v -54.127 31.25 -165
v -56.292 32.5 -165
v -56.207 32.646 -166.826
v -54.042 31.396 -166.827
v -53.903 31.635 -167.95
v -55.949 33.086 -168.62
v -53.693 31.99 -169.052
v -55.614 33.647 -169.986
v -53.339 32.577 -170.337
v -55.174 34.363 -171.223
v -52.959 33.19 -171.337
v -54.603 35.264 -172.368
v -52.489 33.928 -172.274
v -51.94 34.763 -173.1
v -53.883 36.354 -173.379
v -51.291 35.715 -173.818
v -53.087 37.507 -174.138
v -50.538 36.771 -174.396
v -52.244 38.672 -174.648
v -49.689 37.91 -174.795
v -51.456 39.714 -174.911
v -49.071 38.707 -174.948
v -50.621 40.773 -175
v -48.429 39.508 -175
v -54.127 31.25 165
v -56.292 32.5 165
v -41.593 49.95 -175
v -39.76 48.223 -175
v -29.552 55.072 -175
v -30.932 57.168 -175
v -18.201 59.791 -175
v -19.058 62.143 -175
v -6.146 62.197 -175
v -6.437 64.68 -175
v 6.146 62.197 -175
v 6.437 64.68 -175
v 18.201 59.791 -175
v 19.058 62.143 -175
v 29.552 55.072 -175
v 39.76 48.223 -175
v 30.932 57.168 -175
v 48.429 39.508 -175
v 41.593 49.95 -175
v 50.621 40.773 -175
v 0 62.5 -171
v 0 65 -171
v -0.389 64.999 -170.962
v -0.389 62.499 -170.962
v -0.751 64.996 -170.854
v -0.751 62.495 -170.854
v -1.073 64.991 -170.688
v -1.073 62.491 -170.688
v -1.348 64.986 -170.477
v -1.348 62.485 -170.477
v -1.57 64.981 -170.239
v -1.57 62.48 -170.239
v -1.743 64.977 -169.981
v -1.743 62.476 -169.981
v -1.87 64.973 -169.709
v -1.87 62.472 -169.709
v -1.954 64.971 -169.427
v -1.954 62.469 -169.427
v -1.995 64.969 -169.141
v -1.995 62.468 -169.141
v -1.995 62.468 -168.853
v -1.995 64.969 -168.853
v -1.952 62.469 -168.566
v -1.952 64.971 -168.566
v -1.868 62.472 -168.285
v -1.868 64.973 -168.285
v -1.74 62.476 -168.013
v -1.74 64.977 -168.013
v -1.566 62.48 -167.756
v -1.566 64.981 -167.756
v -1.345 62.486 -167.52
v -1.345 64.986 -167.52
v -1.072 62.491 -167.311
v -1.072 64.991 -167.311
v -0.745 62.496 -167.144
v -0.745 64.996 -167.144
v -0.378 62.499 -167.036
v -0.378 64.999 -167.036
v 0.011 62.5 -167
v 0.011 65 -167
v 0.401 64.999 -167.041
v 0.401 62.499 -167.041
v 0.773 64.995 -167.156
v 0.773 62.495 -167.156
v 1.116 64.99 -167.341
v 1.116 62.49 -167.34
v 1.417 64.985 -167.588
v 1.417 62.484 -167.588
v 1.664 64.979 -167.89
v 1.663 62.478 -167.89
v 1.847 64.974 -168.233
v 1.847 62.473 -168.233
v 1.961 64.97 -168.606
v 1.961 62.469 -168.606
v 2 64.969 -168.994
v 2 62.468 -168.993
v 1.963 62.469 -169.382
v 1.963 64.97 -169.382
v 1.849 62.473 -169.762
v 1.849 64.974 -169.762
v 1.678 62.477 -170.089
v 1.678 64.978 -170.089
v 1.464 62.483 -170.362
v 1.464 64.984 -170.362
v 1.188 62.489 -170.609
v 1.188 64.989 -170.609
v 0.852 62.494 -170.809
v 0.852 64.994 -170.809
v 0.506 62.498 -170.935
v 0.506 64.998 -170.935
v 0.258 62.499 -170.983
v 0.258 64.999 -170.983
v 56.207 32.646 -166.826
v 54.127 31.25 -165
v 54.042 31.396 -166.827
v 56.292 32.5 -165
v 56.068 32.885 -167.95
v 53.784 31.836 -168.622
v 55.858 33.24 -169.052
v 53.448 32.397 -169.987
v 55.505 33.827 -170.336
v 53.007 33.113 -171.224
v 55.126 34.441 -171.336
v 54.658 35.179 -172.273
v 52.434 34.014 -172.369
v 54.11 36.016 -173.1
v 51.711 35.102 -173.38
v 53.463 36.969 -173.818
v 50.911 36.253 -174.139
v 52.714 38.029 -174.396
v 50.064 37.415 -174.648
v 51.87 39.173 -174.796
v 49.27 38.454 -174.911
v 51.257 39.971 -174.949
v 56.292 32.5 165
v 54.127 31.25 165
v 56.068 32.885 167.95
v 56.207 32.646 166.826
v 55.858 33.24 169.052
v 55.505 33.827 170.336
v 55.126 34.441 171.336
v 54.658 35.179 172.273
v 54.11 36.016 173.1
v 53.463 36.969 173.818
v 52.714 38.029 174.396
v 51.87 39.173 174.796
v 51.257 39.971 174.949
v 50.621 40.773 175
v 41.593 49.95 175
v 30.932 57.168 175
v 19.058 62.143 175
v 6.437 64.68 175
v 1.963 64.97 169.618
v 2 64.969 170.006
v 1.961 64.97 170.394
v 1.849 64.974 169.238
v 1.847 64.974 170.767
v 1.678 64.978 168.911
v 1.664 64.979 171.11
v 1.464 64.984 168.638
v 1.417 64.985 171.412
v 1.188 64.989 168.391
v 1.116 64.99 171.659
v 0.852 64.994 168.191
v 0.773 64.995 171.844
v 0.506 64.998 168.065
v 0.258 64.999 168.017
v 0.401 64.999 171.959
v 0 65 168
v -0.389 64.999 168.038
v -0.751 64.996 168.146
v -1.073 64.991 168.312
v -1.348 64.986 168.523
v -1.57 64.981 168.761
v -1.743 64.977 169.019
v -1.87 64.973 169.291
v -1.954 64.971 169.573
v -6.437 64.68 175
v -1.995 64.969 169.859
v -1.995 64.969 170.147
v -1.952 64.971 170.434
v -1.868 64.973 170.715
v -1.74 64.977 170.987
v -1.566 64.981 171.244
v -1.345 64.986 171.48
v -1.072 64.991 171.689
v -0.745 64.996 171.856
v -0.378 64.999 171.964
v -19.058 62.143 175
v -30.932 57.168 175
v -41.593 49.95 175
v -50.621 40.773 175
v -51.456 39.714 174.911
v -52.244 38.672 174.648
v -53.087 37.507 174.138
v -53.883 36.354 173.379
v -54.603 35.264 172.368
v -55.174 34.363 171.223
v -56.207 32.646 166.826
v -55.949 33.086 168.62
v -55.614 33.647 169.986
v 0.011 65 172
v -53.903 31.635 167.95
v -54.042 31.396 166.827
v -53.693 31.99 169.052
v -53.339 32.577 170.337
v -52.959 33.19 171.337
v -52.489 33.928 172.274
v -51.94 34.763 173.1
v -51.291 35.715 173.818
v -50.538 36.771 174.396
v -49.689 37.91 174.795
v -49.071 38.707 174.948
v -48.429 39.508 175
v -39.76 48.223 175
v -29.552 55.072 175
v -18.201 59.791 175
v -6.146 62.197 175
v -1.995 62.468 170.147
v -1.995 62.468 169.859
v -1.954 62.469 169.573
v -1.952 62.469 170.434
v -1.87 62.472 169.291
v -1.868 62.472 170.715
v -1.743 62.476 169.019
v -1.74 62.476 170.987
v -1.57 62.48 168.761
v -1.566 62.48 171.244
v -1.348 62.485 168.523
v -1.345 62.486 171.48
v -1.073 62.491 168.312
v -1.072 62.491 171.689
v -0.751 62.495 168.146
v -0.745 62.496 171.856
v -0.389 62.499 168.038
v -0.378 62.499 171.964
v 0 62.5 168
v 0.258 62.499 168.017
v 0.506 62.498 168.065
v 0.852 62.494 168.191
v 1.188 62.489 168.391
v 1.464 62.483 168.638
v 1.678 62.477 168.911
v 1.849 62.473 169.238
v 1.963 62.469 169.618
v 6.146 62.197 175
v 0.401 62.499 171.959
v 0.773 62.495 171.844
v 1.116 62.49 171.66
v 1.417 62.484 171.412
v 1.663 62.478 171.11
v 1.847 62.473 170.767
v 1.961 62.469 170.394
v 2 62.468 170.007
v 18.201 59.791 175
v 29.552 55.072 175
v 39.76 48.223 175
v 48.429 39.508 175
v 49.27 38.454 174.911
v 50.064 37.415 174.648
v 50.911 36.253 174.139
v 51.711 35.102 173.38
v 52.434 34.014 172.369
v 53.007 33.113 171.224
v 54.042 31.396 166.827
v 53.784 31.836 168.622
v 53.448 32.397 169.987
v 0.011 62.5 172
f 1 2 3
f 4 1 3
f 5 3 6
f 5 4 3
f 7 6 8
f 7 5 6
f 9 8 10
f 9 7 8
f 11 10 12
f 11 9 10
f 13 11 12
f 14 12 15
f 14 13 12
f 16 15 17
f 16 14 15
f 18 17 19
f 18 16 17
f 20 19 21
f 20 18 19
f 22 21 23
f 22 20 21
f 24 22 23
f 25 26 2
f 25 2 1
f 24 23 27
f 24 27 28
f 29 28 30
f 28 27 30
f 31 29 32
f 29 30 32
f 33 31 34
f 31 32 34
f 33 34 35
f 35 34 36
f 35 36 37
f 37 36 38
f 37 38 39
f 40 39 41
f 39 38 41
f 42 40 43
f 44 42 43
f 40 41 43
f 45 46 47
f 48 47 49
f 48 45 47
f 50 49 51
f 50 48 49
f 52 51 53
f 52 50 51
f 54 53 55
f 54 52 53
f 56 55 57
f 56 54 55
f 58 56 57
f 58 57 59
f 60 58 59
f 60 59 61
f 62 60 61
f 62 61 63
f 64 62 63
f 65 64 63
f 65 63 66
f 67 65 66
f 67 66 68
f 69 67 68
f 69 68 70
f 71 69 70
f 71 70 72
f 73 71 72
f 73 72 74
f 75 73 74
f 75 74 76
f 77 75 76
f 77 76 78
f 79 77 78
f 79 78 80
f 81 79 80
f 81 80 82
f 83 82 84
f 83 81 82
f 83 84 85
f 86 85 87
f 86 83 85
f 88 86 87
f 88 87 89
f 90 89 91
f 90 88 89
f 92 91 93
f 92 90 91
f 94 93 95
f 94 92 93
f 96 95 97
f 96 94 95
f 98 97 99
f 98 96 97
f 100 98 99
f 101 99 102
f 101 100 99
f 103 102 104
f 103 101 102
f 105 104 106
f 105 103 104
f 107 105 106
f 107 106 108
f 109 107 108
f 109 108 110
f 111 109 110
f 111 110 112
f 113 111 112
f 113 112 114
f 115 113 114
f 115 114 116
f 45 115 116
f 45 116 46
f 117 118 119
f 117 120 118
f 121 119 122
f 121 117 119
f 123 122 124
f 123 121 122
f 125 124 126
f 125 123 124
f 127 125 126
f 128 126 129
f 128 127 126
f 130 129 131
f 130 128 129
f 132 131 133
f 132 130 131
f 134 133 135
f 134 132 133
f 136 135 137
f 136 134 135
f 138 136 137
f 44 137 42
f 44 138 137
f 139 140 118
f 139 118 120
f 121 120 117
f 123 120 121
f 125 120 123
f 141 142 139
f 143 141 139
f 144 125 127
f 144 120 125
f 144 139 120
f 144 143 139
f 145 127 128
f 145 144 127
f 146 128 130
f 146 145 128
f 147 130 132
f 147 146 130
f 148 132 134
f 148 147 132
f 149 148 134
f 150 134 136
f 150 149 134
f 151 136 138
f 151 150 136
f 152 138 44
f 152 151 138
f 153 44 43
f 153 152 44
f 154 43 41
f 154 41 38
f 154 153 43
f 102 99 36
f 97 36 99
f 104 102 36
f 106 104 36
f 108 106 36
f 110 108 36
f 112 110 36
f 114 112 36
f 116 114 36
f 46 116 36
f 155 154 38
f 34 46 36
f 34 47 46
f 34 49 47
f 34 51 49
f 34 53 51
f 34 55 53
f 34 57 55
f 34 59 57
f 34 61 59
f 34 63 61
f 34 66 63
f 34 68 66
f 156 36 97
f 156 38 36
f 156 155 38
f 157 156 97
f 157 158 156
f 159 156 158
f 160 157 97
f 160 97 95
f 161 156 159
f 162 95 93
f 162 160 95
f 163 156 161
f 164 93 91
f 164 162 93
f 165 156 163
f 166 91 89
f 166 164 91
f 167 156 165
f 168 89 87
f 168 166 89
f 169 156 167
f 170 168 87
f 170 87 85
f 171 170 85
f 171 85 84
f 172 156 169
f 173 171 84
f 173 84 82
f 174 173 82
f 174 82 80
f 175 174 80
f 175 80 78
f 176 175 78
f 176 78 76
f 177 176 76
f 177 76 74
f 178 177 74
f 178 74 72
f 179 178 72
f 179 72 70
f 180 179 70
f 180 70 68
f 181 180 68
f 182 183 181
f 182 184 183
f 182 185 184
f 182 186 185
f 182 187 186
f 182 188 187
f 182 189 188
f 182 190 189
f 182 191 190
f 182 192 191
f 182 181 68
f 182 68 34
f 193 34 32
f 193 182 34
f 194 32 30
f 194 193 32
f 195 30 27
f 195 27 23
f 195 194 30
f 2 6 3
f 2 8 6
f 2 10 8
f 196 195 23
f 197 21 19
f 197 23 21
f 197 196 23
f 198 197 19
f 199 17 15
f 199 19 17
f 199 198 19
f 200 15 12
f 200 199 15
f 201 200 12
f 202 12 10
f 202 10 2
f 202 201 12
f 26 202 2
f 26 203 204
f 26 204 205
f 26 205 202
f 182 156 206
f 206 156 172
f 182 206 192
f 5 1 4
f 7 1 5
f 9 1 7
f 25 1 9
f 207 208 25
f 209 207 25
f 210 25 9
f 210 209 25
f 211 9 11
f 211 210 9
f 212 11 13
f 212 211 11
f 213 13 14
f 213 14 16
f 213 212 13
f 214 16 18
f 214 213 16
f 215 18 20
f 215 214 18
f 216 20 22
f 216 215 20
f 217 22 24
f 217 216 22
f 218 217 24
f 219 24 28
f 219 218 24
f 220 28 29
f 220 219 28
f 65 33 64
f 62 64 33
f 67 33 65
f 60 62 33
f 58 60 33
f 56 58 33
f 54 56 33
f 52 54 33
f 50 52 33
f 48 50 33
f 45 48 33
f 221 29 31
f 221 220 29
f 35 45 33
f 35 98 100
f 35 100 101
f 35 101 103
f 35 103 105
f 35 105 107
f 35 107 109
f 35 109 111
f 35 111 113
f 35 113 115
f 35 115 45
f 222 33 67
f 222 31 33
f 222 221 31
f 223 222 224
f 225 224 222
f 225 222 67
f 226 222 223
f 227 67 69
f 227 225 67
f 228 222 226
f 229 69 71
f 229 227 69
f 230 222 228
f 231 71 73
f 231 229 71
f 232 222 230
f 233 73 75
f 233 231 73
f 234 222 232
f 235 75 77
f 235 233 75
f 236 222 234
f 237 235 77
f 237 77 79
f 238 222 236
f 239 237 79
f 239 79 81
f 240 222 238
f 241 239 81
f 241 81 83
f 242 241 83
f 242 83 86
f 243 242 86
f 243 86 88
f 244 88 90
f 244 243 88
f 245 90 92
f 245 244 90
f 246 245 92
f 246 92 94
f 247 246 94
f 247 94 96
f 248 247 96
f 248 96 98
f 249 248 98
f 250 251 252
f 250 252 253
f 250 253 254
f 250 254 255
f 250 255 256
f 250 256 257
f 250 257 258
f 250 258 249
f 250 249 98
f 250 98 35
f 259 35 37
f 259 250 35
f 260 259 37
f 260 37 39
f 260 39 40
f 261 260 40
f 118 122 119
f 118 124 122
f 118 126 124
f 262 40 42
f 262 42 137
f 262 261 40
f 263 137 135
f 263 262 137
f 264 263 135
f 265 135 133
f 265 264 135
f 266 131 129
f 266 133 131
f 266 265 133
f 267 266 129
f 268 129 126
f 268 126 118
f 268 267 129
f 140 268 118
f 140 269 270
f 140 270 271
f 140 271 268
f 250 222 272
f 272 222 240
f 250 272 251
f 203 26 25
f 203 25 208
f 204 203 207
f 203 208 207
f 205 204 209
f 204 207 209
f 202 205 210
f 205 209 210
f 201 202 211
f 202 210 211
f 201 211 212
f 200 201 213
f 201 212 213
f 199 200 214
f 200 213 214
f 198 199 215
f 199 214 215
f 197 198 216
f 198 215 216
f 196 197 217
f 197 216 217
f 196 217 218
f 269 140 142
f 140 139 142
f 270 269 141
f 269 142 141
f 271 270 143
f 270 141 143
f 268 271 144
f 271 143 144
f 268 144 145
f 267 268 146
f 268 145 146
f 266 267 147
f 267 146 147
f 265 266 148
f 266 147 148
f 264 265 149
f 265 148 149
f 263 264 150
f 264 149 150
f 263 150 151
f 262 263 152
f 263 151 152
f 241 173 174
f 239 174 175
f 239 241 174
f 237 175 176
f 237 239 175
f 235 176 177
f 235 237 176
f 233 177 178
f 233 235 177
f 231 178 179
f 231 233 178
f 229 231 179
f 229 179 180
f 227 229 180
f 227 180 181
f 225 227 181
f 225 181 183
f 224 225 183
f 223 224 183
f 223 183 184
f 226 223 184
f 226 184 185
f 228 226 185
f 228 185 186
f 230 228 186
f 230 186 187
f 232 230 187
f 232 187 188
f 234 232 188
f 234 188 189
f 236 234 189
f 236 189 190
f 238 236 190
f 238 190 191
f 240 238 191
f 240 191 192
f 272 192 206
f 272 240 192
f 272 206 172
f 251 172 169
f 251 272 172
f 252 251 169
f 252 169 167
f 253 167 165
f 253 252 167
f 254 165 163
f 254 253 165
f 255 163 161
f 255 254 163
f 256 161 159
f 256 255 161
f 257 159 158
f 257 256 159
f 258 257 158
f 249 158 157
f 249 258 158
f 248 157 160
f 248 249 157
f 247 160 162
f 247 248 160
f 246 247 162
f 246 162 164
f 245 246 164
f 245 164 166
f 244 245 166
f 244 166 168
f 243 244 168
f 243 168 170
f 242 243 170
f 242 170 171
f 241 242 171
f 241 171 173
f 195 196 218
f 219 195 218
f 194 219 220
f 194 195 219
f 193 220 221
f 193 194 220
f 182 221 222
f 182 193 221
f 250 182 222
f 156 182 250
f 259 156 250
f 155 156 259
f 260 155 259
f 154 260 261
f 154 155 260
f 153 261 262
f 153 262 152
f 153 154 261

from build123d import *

# Parameters (mm, degrees)
BOSS_EXTRUDE1_DEPTH = 175
FILLET1_R           = 10
SKETCH3_R           = 2
CUT_EXTRUDE1_DEPTH  = 340


with BuildPart() as part:
    # Sketch1 → Boss-Extrude1 (new, symmetric)
    with BuildSketch(Plane.XY):
        with BuildLine():
            Line((-56.291651246, 32.5), (-54.126587737, 31.25))
            ThreePointArc((-54.126587737, 31.25), (0, 62.5), (54.126587737, 31.25))
            Line((54.126587737, 31.25), (56.291651246, 32.5))
            ThreePointArc((56.291651246, 32.5), (0, 65), (-56.291651246, 32.5))
        make_face()
    extrude(amount=BOSS_EXTRUDE1_DEPTH, both=True)

    # Fillet1
    fillet1_edges = [part.edges().sort_by_distance(p)[0] for p in [
        (55.209119491, 31.875, 175),
        (55.209119491, 31.875, -175),
        (-55.209119491, 31.875, -175),
        (-55.209119491, 31.875, 175),
    ]]
    fillet(fillet1_edges, radius=FILLET1_R)

    # Sketch3 → Cut-Extrude1 (cut)
    with BuildSketch(Plane(origin=(0, 0, 0), x_dir=(1, 0, 0), z_dir=(0, 1, 0))):
        with Locations(Location((0, -170, 0), (0, 0, 90))):
            Circle(SKETCH3_R)
        with Locations(Location((0, 169, 0), (0, 0, 90))):
            Circle(SKETCH3_R)
    extrude(amount=CUT_EXTRUDE1_DEPTH, mode=Mode.SUBTRACT)


solid = part.part
